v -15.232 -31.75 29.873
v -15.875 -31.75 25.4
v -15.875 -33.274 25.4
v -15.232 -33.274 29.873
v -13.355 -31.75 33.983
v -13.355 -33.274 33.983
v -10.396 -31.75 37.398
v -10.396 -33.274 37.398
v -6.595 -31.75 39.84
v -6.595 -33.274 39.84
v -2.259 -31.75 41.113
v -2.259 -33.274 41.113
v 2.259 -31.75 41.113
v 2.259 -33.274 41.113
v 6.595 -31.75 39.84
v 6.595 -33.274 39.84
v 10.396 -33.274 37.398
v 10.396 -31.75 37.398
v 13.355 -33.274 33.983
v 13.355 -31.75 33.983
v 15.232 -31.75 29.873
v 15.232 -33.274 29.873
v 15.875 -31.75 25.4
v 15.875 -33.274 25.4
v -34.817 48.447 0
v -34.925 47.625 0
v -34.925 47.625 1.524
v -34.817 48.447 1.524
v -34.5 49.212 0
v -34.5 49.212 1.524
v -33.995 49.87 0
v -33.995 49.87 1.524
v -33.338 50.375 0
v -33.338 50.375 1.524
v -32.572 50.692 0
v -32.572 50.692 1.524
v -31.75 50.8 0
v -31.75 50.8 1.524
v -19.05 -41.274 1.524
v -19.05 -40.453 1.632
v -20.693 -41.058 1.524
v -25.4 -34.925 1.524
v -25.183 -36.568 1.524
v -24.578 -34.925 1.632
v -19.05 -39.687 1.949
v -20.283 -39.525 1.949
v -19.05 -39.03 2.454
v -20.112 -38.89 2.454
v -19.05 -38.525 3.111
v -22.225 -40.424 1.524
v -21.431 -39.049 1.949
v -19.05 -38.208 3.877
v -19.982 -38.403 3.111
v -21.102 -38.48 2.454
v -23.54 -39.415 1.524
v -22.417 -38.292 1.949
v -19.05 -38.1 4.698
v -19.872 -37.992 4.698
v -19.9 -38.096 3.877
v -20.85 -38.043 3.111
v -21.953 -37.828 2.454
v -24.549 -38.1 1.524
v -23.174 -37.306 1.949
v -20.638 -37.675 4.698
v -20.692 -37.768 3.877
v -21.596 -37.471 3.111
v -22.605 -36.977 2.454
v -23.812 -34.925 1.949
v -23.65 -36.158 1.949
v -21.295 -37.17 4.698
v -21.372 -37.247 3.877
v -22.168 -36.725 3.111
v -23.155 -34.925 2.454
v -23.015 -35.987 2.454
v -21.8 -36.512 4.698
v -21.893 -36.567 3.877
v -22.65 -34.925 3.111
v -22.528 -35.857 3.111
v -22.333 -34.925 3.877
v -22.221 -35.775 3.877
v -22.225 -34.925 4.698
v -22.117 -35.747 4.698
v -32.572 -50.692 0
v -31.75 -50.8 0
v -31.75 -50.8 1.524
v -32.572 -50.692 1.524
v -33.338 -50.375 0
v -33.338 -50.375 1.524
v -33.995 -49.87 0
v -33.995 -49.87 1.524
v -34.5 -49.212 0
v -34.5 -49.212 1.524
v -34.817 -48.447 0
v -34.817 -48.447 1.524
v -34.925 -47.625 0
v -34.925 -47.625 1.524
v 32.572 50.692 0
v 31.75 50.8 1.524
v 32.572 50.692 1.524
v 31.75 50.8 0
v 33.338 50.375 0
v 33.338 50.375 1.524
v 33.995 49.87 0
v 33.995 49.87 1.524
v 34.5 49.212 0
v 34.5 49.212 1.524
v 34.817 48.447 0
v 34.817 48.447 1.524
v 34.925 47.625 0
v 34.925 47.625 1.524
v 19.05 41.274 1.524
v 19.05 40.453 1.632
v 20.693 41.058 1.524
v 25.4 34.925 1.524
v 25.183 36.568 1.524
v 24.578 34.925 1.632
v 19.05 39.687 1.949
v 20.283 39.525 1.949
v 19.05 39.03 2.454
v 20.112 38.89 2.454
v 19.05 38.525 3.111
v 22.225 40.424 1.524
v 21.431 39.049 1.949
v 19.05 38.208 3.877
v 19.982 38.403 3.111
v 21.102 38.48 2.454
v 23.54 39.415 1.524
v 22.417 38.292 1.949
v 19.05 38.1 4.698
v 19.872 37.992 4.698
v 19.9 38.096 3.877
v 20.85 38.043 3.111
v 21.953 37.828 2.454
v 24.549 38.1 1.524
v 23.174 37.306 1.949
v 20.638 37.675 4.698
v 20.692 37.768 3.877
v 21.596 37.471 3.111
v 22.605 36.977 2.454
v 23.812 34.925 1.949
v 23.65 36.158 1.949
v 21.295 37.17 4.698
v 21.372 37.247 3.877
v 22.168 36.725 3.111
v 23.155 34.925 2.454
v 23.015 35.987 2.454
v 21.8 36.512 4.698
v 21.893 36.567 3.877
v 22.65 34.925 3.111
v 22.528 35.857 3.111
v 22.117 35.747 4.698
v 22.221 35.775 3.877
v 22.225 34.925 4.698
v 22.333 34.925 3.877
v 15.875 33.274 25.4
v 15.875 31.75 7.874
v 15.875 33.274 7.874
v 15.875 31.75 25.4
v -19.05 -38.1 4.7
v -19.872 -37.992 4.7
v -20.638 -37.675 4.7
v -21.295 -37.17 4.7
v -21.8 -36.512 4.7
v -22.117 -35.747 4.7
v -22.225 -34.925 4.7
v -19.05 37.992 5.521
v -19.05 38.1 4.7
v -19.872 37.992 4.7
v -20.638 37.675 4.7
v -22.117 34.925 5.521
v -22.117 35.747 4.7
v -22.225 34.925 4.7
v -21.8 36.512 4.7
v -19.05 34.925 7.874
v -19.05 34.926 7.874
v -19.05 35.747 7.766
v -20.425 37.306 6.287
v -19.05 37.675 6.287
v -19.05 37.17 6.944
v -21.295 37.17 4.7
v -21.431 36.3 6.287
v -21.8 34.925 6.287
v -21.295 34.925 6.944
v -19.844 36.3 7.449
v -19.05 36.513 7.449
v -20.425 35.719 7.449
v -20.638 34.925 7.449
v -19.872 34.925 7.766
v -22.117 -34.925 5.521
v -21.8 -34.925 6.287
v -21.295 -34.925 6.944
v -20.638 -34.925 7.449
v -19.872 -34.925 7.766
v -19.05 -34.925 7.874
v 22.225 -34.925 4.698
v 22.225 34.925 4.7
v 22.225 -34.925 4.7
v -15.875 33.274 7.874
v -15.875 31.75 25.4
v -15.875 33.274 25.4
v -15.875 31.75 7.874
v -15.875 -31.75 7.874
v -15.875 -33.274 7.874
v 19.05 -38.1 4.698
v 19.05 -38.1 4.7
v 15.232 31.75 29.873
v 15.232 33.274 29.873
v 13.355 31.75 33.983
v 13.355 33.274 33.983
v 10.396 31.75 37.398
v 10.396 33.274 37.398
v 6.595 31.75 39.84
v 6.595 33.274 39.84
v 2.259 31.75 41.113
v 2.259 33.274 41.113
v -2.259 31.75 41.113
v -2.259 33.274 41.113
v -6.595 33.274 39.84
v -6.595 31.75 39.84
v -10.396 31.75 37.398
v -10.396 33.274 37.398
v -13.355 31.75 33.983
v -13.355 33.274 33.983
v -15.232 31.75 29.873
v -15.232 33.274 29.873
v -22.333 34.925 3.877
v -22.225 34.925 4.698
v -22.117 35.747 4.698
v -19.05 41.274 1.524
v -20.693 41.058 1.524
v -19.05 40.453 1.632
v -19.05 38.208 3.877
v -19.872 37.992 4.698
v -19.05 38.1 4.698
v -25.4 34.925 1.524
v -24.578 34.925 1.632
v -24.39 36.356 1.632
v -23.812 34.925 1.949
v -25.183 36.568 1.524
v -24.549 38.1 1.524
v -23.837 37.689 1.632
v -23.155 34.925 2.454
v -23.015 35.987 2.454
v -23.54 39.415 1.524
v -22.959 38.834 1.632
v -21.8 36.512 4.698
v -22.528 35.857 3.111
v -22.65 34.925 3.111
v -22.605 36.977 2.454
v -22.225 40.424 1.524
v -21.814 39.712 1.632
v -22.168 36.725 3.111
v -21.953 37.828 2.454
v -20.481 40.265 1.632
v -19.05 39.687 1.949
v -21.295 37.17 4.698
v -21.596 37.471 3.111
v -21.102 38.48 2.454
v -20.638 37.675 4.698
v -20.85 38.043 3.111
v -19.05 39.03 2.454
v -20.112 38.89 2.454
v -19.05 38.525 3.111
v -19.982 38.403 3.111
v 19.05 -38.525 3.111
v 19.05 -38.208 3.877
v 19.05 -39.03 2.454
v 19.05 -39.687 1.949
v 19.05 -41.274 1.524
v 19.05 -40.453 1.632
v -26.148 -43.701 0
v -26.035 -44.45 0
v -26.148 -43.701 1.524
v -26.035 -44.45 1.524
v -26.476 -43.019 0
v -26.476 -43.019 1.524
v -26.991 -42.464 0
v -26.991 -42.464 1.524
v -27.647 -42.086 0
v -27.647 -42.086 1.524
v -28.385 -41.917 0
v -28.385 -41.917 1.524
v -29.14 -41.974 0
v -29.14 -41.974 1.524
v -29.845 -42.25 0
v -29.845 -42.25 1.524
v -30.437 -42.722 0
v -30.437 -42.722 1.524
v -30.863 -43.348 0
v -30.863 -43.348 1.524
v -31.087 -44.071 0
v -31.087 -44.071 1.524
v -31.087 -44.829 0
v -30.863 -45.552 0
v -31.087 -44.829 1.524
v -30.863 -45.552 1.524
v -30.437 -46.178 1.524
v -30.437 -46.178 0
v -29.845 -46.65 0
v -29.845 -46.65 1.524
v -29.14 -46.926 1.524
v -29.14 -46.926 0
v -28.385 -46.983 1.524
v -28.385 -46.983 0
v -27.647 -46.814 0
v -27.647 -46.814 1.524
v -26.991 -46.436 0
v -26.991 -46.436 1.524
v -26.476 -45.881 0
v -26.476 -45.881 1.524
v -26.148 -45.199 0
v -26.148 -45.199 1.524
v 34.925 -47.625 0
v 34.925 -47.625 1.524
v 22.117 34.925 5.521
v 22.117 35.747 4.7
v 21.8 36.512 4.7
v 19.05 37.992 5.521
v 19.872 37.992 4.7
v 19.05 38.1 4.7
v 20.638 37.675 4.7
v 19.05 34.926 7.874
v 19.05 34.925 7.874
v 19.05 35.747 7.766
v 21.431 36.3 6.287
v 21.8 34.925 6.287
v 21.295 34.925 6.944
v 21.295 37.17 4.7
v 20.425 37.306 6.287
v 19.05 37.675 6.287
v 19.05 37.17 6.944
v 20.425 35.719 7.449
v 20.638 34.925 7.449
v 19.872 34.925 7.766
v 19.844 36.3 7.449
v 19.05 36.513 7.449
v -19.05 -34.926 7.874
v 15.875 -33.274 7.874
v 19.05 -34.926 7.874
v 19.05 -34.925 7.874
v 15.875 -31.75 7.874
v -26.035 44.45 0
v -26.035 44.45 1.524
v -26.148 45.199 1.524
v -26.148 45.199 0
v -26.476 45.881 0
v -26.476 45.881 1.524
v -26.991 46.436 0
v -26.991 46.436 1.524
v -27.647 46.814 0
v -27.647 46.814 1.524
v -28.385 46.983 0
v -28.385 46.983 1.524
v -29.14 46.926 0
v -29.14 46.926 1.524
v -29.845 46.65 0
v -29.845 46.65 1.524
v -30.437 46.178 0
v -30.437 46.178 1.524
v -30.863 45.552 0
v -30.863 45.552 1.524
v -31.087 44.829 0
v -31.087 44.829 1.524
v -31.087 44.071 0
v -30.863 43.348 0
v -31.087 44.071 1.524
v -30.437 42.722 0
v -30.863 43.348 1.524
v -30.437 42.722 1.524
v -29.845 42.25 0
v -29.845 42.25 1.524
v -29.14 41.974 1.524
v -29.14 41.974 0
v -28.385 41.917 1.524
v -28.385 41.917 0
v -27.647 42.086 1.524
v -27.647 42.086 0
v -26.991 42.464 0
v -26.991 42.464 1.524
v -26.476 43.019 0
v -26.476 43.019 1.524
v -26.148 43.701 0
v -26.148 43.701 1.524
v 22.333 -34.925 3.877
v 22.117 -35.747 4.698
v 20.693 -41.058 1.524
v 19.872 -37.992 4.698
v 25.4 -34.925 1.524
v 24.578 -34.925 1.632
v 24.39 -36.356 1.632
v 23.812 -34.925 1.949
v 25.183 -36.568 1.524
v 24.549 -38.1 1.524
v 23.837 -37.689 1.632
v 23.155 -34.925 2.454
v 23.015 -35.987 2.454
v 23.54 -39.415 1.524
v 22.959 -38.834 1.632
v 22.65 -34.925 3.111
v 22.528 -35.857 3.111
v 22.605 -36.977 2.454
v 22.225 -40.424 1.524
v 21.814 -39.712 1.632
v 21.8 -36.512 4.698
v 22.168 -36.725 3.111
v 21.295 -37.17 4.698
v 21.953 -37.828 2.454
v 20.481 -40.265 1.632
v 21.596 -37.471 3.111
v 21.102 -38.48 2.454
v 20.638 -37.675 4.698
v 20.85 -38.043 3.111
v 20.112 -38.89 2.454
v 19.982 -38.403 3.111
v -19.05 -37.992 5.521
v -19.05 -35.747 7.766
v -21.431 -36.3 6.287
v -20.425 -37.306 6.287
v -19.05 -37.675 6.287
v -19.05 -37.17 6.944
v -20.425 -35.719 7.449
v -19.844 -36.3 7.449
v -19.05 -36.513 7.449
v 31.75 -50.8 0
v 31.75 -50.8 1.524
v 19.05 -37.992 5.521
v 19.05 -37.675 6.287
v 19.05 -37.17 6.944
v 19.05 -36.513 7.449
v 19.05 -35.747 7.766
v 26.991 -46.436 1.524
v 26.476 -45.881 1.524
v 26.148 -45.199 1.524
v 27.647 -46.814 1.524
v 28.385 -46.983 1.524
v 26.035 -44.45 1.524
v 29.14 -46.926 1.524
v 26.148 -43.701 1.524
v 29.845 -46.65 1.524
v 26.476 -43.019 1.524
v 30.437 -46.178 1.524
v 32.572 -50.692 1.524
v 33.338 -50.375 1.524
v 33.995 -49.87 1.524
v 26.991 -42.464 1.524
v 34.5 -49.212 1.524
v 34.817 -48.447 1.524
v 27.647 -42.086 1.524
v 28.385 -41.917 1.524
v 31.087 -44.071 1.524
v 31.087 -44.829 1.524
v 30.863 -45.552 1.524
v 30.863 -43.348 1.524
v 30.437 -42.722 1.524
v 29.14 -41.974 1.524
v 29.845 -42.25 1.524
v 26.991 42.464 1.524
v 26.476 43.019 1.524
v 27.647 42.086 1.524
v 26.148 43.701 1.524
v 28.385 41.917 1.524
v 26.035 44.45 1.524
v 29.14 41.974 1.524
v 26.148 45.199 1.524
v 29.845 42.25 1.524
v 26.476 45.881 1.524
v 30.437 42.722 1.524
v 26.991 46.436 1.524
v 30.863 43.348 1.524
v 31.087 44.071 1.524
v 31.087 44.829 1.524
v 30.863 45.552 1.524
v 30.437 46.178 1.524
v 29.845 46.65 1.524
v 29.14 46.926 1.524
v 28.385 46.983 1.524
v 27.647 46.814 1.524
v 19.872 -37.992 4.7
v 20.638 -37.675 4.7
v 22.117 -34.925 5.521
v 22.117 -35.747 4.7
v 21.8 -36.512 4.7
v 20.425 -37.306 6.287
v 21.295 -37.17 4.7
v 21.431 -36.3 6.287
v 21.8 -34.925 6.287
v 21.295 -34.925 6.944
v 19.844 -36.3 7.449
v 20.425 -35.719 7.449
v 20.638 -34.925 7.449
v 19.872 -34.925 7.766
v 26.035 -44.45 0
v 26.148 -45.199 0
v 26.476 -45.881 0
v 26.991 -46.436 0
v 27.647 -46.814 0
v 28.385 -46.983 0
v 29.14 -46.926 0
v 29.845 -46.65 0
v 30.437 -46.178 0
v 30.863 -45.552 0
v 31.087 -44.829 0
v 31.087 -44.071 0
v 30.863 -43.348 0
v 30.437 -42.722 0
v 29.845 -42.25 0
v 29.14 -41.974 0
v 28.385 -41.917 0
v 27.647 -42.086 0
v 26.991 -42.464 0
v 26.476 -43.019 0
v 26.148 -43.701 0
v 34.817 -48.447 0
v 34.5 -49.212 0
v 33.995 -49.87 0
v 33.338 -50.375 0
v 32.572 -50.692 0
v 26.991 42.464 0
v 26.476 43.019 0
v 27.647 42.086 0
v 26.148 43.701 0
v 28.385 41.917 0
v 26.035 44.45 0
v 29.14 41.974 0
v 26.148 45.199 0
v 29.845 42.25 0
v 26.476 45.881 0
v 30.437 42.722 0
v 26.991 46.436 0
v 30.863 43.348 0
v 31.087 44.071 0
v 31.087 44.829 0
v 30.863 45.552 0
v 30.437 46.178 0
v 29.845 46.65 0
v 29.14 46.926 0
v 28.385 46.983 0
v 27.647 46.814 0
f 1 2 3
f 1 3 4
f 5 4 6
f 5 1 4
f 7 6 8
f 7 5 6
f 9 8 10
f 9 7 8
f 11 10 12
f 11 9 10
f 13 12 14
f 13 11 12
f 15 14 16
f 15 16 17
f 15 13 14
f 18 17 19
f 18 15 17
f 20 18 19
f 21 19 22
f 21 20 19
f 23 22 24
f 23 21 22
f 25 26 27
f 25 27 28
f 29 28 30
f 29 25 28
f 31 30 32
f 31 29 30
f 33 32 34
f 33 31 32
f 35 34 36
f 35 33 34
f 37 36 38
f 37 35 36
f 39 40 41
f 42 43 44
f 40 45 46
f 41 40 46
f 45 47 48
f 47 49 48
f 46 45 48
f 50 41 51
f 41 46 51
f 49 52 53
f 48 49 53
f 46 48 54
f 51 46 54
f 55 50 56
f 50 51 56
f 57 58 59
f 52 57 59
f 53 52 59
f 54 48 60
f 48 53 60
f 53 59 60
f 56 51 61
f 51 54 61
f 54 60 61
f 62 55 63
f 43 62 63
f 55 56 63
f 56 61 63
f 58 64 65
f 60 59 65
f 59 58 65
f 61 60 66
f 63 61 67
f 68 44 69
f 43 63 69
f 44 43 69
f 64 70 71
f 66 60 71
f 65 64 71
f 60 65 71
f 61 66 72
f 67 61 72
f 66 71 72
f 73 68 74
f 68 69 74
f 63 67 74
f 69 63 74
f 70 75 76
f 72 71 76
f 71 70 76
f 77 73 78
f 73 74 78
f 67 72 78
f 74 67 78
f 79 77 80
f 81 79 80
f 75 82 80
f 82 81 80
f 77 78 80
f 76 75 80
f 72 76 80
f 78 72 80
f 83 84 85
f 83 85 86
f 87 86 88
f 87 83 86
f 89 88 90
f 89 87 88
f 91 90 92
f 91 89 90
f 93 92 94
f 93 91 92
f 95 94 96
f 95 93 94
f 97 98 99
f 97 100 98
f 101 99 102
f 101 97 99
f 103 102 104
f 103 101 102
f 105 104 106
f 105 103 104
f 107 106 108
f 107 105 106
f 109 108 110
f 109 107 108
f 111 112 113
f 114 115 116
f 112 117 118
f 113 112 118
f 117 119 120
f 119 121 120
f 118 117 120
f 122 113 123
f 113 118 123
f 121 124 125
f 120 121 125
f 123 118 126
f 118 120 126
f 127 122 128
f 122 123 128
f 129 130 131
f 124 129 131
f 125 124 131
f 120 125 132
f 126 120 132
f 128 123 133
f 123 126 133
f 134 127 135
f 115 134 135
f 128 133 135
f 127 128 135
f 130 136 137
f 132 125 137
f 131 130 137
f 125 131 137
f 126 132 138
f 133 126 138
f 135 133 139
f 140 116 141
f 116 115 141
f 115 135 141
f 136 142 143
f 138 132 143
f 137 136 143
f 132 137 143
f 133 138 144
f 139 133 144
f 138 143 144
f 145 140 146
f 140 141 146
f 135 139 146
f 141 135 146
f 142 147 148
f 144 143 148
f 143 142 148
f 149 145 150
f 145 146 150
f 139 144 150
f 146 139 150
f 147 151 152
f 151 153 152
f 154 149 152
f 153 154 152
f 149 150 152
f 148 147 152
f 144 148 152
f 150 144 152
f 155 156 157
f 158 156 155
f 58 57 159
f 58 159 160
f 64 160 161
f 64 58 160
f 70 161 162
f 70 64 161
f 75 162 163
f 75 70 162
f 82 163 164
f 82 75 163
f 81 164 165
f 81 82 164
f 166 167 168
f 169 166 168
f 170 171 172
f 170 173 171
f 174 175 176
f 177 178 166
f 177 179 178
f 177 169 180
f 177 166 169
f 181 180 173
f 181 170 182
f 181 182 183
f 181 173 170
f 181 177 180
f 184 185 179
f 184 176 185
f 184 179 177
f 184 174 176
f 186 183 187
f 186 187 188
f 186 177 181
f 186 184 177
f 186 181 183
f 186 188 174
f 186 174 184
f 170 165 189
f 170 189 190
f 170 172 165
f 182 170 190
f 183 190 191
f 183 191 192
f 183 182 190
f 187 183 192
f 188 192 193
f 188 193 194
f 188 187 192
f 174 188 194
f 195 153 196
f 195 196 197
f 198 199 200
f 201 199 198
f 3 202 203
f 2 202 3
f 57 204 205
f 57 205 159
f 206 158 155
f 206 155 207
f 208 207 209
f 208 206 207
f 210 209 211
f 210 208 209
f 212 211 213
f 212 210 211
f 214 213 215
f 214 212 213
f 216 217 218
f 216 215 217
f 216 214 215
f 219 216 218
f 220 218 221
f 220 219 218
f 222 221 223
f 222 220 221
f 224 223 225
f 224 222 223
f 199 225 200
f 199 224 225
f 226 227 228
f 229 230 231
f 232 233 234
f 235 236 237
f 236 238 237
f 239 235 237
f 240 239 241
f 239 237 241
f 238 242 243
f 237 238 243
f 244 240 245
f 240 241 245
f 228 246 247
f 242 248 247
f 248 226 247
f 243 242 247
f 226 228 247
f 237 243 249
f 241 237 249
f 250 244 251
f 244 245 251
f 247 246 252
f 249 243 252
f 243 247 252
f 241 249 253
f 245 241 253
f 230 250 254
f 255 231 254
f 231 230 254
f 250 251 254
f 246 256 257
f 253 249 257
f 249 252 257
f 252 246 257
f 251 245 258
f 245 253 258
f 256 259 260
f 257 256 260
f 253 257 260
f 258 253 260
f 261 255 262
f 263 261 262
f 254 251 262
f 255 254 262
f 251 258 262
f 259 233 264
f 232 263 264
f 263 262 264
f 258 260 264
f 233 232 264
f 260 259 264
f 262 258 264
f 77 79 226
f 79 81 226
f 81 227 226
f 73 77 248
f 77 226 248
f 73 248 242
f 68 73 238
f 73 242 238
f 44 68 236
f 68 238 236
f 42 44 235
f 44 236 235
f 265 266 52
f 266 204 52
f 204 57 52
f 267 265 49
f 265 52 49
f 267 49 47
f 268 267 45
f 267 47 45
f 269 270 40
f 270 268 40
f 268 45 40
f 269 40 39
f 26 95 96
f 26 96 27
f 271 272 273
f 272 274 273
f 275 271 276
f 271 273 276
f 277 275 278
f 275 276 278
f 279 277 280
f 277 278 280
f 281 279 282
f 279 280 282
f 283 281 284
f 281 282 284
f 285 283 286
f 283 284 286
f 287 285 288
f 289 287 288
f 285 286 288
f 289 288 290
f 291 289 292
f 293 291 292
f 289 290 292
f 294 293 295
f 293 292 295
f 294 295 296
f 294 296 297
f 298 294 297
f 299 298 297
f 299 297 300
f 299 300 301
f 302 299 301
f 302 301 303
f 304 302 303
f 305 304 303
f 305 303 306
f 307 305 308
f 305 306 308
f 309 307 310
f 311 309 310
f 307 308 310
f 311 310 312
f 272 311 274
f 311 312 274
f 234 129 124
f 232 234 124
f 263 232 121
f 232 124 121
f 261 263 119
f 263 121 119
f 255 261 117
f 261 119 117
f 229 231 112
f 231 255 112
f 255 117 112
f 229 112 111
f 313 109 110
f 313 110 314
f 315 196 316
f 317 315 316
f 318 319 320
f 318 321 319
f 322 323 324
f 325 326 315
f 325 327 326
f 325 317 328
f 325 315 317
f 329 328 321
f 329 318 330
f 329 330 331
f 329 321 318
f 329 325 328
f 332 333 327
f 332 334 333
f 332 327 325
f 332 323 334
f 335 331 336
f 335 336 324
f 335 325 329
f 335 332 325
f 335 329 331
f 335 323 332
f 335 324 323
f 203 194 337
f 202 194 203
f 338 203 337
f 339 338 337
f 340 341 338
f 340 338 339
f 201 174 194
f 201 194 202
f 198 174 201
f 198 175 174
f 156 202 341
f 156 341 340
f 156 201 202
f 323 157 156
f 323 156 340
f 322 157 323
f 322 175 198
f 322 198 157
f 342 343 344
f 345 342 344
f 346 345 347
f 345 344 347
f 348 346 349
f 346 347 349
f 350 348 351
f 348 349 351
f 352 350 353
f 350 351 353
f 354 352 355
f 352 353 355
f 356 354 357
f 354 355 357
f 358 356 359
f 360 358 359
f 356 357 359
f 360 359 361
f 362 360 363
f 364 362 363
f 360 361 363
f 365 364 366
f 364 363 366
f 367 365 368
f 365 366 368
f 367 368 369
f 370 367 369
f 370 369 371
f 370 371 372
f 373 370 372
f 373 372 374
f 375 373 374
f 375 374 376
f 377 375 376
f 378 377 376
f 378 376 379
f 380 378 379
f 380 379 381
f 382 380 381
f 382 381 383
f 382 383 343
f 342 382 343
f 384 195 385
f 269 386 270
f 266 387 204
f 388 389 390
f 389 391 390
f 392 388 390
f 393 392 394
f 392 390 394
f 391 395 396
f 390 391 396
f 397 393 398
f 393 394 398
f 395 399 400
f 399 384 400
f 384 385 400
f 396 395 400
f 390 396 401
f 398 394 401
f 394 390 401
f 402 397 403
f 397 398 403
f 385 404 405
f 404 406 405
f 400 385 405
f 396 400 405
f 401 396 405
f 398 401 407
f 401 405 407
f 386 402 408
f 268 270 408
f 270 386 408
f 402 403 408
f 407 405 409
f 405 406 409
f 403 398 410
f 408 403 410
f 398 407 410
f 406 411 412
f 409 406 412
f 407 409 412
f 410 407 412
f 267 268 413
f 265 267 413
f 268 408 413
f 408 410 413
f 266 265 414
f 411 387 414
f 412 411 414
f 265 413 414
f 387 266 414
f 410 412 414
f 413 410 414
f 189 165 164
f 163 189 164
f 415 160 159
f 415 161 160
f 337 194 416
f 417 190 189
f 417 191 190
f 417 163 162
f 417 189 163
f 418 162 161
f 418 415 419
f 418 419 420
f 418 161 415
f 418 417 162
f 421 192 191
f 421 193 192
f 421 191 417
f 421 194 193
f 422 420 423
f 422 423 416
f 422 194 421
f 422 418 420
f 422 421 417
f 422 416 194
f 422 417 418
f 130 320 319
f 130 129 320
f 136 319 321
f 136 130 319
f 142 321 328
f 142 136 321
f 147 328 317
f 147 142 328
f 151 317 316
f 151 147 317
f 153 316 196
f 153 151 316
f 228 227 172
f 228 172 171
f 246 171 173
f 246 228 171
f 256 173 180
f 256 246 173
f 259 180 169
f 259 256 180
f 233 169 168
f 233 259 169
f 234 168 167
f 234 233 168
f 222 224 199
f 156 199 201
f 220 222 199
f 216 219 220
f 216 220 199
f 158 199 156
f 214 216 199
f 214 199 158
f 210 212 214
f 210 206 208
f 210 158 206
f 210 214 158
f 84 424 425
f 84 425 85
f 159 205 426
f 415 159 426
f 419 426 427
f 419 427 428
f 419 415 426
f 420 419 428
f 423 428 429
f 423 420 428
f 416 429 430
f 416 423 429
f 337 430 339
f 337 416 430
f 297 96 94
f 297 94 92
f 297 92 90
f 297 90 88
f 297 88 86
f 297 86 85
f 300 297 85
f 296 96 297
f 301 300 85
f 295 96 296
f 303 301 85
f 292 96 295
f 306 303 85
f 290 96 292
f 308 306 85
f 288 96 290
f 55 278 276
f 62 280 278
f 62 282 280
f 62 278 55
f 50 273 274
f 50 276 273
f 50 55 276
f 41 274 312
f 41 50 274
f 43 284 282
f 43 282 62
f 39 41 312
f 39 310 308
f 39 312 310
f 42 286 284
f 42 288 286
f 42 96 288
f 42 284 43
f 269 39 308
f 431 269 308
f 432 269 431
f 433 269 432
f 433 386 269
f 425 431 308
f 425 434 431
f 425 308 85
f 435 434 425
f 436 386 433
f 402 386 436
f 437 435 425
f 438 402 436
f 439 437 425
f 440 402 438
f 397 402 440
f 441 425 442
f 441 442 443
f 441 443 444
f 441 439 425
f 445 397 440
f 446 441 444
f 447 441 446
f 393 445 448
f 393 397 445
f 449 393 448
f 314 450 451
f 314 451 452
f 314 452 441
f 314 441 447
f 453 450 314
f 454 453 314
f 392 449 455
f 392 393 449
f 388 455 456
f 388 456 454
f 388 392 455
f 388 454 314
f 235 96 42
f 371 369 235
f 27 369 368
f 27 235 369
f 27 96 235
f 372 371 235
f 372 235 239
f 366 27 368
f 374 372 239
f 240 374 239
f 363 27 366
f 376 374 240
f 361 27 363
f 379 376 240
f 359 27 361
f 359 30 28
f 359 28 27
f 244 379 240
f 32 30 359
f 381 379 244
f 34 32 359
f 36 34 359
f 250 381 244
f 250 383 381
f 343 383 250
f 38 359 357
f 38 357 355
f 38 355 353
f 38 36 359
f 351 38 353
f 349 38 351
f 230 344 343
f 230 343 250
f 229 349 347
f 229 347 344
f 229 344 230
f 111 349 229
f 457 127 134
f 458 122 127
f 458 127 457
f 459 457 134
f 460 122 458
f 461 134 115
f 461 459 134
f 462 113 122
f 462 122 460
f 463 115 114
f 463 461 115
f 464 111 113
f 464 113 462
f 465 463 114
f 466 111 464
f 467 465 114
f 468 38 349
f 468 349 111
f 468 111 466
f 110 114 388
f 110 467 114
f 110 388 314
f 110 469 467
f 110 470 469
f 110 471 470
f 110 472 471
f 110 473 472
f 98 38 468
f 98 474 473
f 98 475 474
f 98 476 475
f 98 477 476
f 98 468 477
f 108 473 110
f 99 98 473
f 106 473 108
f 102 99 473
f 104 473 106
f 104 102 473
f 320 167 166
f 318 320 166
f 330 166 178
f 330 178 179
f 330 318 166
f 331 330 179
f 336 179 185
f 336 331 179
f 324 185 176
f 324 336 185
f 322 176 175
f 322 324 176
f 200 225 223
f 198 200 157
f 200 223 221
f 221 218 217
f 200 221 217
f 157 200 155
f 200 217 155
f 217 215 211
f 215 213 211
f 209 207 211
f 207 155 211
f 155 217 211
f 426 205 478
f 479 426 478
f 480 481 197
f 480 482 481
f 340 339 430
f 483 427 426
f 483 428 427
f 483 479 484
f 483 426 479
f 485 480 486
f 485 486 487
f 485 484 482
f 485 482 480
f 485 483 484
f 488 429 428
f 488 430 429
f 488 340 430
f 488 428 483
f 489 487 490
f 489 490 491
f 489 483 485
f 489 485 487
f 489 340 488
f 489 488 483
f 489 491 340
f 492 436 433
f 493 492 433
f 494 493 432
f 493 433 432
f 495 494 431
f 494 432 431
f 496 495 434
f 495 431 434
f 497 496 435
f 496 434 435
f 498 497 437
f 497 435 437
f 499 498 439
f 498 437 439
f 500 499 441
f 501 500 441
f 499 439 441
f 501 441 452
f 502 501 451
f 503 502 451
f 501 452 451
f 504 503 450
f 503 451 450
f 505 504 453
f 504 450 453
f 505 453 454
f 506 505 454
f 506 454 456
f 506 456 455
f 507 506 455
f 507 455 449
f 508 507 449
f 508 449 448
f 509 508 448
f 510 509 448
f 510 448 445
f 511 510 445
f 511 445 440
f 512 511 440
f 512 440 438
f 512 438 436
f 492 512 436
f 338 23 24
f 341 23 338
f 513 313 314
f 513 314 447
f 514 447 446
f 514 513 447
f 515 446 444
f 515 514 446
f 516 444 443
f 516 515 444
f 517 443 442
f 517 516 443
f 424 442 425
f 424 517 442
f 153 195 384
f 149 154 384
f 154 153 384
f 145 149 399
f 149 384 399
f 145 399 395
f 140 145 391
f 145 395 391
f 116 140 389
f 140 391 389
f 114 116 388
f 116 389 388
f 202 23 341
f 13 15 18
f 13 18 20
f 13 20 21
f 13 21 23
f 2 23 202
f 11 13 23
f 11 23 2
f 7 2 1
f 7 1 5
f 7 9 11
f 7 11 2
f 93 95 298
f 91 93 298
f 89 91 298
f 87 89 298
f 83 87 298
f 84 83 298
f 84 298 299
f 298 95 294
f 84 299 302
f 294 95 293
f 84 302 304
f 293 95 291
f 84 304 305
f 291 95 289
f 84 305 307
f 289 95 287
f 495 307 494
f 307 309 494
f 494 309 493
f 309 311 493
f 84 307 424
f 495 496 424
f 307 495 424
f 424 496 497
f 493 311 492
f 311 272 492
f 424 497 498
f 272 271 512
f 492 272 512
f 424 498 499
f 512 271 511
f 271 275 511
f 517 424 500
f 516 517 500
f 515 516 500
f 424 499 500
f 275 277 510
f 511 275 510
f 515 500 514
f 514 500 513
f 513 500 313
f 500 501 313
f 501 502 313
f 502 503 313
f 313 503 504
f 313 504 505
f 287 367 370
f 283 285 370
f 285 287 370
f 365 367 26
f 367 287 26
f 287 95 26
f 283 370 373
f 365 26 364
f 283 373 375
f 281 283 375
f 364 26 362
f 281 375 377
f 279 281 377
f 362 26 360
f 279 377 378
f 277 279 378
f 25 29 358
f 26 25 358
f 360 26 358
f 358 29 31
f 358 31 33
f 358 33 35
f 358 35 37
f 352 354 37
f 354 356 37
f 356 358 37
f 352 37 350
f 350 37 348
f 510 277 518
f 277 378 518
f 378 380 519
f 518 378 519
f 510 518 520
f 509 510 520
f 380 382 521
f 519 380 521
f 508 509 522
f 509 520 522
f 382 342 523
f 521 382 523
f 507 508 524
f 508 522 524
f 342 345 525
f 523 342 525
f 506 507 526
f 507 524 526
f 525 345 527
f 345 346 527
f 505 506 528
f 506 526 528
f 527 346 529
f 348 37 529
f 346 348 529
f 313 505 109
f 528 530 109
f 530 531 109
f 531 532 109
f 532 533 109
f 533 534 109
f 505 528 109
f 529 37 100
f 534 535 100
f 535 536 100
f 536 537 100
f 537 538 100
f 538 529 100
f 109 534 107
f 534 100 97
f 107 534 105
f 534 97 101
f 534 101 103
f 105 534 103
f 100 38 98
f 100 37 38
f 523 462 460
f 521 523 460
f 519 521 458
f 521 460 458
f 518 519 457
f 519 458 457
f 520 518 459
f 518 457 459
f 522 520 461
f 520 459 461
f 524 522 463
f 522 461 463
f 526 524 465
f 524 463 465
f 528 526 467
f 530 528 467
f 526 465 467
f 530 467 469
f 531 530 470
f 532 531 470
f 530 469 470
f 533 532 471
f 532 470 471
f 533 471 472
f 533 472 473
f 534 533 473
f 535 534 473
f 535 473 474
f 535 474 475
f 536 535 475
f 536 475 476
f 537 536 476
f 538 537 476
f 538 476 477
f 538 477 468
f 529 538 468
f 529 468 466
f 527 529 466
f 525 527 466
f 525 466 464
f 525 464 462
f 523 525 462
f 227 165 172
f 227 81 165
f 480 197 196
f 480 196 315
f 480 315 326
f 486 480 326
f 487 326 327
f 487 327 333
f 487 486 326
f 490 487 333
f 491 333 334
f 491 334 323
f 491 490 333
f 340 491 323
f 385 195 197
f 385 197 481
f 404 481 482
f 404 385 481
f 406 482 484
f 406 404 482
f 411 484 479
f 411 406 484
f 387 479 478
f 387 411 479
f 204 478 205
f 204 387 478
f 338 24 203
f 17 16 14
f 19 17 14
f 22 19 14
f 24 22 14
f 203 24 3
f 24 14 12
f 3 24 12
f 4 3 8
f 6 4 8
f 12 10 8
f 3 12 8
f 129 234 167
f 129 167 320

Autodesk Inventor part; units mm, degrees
ref_plane "YZ Plane" through (0, 0, 0) normal (1, 0, 0) x (0, 1, 0)
ref_plane "XZ Plane" through (0, 0, 0) normal (0, 1, 0) x (-1, 0, 0)
sketch "Sketch2" plane through (0, 0, 0) normal (0, 0, 1) x (1, 0, 0)
  line L0 (-31.75, 50.8) -> (31.75, 50.8)
  line L1 (34.925, 47.625) -> (34.925, -47.625)
  line L2 (31.75, -50.8) -> (-31.75, -50.8)
  line L3 (-34.925, -47.625) -> (-34.925, 47.625)
  arc A0 (-31.75, 50.8) -> (-34.925, 47.625) centre (-31.75, 47.625) ccw
  arc A1 (34.925, 47.625) -> (31.75, 50.8) centre (31.75, 47.625) ccw
  arc A2 (31.75, -50.8) -> (34.925, -47.625) centre (31.75, -47.625) ccw
  arc A3 (-34.925, -47.625) -> (-31.75, -50.8) centre (-31.75, -47.625) ccw
  point P0 (0, 0)
  point P1 (-34.925, 50.8)
  point P2 (34.925, -50.8)
  point P3 (34.925, 50.8)
  point P4 (-34.925, -50.8)
  point P5 (-34.925, 0)
  point P6 (0, 50.8)
  dimension "d0" = 69.85
  dimension "d1" = 101.6
  dimension "d4" = 3.175
extrude "Extrusion1" add sketch "Sketch2" along normal blind 1.524
sketch "Sketch3" plane through (0, 0, 1.524) normal (0, 0, 1) x (1, 0, 0)
  line L0 (-19.05, 38.1) -> (19.05, 38.1)
  line L1 (22.225, 34.925) -> (22.225, -34.925)
  line L2 (19.05, -38.1) -> (-19.05, -38.1)
  line L3 (-22.225, -34.925) -> (-22.225, 34.925)
  arc A0 (-19.05, 38.1) -> (-22.225, 34.925) centre (-19.05, 34.925) ccw
  arc A1 (22.225, 34.925) -> (19.05, 38.1) centre (19.05, 34.925) ccw
  arc A2 (19.05, -38.1) -> (22.225, -34.925) centre (19.05, -34.925) ccw
  arc A3 (-22.225, -34.925) -> (-19.05, -38.1) centre (-19.05, -34.925) ccw
  line L4 (31.75, -50.8) -> (-31.75, -50.8) projected
  line L5 (-34.925, -47.625) -> (-34.925, 47.625) projected
  point P0 (0, 0)
  point P1 (0, 38.1)
  point P2 (-22.225, 0)
  dimension "d7" = 3.175
  dimension "d8" = 12.7
  dimension "d9" = 12.7
extrude "Extrusion2" add sketch "Sketch3" along normal blind 6.35
fillet "Fillet1" radius 3.175 16 edges at (0, 38.1, 7.874) (21.2951, 37.1701, 7.874) (22.225, 0, 7.874) (21.2951, -37.1701, 7.874) (0, -38.1, 7.874) (-21.2951, -37.1701, 7.874) (-22.225, 0, 7.874) (-21.2951, 37.1701, 7.874) (0, 38.1, 1.524) (21.2951, 37.1701, 1.524) (22.225, 0, 1.524) (21.2951, -37.1701, 1.524) (0, -38.1, 1.524) (-21.2951, -37.1701, 1.524) (-22.225, 0, 1.524) (-21.2951, 37.1701, 1.524)
ref_plane "Work Plane1" through (0, -31.75, 0) normal (0, 1, 0) x (-1, 0, 0)
sketch "Sketch4" plane through (0, -31.75, 0) normal (0, 1, 0) x (-1, 0, 0)
  line L0 (-15.875, 0) -> (15.875, 0)
  line L1 (15.875, 0) -> (15.875, 25.4)
  line L2 (15.875, 25.4) -> (-15.875, 25.4)
  line L3 (-15.875, 25.4) -> (-15.875, 0)
  circle A0 centre (0, 25.4) radius 15.875
  line L4 (-31.75, 0) -> (31.75, 0) projected
  point P0 (0, 0)
  point P1 (0, 0)
  point P2 (0, 0)
  dimension "d15" = 31.75
  dimension "d14" = 25.4
extrude "Extrusion3" add sketch "Sketch4" against normal blind 1.524
mirror "Mirror1" about plane through (0, 0, 0) normal (0, 1, 0) of "Extrusion3"
sketch "Sketch5" plane through (0, 0, 1.524) normal (0, 0, 1) x (1, 0, 0)
  circle A0 centre (-28.575, -44.45) radius 2.54
  line L0 (-34.925, -47.625) -> (-34.925, 47.625) projected
  line L1 (31.75, -50.8) -> (-31.75, -50.8) projected
  point P0 (0, 0)
  dimension "d18" = 5.08
  dimension "d19" = 6.35
  dimension "d20" = 6.35
extrude "Extrusion4" cut sketch "Sketch5" against normal through all
mirror "Mirror2" about plane through (0, 0, 0) normal (0, 1, 0) of "Extrusion4"
mirror "Mirror3" about plane through (0, 0, 0) normal (1, 0, 0) of "Extrusion4", "Mirror2"
